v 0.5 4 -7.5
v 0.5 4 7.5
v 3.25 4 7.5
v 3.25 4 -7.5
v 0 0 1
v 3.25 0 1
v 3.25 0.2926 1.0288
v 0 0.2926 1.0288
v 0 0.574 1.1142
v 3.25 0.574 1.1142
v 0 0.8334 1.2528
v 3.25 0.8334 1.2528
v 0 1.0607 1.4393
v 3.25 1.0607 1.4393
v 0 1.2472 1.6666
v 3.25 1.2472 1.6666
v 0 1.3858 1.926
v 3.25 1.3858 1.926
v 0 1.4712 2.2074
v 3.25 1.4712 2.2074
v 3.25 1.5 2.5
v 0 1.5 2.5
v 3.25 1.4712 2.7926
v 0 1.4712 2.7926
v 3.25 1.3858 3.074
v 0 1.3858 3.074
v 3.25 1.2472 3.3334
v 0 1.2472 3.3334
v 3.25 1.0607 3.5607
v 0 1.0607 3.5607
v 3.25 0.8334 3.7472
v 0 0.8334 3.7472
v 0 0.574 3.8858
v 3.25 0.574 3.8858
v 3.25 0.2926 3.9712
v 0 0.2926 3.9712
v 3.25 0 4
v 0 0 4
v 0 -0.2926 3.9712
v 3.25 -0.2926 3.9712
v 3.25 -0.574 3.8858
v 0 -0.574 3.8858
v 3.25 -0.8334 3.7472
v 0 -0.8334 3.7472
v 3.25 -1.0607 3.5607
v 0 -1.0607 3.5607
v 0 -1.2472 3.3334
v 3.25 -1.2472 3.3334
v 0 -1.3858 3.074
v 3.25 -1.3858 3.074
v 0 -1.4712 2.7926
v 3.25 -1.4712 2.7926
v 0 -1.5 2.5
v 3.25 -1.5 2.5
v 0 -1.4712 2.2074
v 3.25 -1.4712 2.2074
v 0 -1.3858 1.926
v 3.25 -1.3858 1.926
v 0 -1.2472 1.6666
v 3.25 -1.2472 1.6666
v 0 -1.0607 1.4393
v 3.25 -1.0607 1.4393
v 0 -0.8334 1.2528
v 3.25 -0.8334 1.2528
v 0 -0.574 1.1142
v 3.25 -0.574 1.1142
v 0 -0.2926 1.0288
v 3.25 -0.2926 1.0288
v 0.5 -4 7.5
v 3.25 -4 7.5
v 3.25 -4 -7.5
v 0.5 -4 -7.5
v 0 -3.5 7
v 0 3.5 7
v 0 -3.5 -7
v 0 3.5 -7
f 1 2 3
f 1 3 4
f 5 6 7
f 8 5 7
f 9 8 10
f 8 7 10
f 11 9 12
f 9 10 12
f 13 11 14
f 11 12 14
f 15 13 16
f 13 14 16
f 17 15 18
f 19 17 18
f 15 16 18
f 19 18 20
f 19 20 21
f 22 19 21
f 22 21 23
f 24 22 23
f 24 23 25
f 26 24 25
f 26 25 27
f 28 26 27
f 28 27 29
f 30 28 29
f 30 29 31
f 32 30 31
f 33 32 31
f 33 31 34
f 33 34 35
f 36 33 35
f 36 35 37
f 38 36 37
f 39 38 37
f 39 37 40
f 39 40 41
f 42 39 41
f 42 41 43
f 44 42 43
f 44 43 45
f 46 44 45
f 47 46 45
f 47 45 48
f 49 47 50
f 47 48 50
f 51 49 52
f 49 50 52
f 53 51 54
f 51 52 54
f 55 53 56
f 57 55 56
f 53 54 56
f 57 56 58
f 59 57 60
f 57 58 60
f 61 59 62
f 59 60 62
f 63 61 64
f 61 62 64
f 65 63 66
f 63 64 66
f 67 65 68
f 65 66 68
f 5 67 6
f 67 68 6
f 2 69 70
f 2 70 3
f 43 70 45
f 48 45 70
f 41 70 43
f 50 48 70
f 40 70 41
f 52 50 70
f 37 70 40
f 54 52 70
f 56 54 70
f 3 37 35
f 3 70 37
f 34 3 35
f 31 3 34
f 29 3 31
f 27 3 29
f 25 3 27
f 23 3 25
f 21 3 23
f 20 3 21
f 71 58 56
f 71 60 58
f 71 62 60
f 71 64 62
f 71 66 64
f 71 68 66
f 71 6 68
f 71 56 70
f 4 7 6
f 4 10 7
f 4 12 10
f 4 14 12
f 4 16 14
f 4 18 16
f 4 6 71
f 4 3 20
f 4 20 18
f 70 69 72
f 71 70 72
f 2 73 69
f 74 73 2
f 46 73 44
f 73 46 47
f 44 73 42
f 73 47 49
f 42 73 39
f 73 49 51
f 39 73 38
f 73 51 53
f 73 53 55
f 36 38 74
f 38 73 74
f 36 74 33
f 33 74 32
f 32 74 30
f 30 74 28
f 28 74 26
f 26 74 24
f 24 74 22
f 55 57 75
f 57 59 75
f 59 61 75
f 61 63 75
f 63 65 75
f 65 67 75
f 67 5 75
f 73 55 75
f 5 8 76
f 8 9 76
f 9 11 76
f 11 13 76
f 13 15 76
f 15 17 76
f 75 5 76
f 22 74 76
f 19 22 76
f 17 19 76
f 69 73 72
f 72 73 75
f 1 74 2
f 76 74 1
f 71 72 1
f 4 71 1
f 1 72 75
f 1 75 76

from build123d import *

# Parameters (mm, degrees)
SKETCH_1_W          = 15
SKETCH_1_H          = 8
EXTRUDE_1_DEPTH     = 3.25
SKETCH_2_R          = 1.5
CUT_EXTRUDE_1_DEPTH = 10.100137362
CHAMFER_1_SIZE      = 0.5


with BuildPart() as part:
    # 草图1 → 凸台-拉伸1 (new body)
    with BuildSketch(Plane(origin=(0, 0, 0), x_dir=(0, 0, -1), z_dir=(1, 0, 0))):
        Rectangle(SKETCH_1_W, SKETCH_1_H)
    extrude(amount=EXTRUDE_1_DEPTH)

    # 草图2 → 切除-拉伸1 (cut, through all)
    with BuildSketch(Plane(origin=(3.25, 0, 0), x_dir=(0, 0, -1), z_dir=(1, 0, 0))):
        with Locations((-2.5, 0)):
            Circle(SKETCH_2_R)
    extrude(amount=-CUT_EXTRUDE_1_DEPTH, mode=Mode.SUBTRACT)

    # 倒角1
    chamfer_1_edges = [part.edges().sort_by_distance(p)[0] for p in [
        (0, 4, 0),
        (0, 0, -7.5),
        (0, -4, 0),
        (0, 0, 7.5),
    ]]
    chamfer(chamfer_1_edges, length=CHAMFER_1_SIZE)


solid = part.part
